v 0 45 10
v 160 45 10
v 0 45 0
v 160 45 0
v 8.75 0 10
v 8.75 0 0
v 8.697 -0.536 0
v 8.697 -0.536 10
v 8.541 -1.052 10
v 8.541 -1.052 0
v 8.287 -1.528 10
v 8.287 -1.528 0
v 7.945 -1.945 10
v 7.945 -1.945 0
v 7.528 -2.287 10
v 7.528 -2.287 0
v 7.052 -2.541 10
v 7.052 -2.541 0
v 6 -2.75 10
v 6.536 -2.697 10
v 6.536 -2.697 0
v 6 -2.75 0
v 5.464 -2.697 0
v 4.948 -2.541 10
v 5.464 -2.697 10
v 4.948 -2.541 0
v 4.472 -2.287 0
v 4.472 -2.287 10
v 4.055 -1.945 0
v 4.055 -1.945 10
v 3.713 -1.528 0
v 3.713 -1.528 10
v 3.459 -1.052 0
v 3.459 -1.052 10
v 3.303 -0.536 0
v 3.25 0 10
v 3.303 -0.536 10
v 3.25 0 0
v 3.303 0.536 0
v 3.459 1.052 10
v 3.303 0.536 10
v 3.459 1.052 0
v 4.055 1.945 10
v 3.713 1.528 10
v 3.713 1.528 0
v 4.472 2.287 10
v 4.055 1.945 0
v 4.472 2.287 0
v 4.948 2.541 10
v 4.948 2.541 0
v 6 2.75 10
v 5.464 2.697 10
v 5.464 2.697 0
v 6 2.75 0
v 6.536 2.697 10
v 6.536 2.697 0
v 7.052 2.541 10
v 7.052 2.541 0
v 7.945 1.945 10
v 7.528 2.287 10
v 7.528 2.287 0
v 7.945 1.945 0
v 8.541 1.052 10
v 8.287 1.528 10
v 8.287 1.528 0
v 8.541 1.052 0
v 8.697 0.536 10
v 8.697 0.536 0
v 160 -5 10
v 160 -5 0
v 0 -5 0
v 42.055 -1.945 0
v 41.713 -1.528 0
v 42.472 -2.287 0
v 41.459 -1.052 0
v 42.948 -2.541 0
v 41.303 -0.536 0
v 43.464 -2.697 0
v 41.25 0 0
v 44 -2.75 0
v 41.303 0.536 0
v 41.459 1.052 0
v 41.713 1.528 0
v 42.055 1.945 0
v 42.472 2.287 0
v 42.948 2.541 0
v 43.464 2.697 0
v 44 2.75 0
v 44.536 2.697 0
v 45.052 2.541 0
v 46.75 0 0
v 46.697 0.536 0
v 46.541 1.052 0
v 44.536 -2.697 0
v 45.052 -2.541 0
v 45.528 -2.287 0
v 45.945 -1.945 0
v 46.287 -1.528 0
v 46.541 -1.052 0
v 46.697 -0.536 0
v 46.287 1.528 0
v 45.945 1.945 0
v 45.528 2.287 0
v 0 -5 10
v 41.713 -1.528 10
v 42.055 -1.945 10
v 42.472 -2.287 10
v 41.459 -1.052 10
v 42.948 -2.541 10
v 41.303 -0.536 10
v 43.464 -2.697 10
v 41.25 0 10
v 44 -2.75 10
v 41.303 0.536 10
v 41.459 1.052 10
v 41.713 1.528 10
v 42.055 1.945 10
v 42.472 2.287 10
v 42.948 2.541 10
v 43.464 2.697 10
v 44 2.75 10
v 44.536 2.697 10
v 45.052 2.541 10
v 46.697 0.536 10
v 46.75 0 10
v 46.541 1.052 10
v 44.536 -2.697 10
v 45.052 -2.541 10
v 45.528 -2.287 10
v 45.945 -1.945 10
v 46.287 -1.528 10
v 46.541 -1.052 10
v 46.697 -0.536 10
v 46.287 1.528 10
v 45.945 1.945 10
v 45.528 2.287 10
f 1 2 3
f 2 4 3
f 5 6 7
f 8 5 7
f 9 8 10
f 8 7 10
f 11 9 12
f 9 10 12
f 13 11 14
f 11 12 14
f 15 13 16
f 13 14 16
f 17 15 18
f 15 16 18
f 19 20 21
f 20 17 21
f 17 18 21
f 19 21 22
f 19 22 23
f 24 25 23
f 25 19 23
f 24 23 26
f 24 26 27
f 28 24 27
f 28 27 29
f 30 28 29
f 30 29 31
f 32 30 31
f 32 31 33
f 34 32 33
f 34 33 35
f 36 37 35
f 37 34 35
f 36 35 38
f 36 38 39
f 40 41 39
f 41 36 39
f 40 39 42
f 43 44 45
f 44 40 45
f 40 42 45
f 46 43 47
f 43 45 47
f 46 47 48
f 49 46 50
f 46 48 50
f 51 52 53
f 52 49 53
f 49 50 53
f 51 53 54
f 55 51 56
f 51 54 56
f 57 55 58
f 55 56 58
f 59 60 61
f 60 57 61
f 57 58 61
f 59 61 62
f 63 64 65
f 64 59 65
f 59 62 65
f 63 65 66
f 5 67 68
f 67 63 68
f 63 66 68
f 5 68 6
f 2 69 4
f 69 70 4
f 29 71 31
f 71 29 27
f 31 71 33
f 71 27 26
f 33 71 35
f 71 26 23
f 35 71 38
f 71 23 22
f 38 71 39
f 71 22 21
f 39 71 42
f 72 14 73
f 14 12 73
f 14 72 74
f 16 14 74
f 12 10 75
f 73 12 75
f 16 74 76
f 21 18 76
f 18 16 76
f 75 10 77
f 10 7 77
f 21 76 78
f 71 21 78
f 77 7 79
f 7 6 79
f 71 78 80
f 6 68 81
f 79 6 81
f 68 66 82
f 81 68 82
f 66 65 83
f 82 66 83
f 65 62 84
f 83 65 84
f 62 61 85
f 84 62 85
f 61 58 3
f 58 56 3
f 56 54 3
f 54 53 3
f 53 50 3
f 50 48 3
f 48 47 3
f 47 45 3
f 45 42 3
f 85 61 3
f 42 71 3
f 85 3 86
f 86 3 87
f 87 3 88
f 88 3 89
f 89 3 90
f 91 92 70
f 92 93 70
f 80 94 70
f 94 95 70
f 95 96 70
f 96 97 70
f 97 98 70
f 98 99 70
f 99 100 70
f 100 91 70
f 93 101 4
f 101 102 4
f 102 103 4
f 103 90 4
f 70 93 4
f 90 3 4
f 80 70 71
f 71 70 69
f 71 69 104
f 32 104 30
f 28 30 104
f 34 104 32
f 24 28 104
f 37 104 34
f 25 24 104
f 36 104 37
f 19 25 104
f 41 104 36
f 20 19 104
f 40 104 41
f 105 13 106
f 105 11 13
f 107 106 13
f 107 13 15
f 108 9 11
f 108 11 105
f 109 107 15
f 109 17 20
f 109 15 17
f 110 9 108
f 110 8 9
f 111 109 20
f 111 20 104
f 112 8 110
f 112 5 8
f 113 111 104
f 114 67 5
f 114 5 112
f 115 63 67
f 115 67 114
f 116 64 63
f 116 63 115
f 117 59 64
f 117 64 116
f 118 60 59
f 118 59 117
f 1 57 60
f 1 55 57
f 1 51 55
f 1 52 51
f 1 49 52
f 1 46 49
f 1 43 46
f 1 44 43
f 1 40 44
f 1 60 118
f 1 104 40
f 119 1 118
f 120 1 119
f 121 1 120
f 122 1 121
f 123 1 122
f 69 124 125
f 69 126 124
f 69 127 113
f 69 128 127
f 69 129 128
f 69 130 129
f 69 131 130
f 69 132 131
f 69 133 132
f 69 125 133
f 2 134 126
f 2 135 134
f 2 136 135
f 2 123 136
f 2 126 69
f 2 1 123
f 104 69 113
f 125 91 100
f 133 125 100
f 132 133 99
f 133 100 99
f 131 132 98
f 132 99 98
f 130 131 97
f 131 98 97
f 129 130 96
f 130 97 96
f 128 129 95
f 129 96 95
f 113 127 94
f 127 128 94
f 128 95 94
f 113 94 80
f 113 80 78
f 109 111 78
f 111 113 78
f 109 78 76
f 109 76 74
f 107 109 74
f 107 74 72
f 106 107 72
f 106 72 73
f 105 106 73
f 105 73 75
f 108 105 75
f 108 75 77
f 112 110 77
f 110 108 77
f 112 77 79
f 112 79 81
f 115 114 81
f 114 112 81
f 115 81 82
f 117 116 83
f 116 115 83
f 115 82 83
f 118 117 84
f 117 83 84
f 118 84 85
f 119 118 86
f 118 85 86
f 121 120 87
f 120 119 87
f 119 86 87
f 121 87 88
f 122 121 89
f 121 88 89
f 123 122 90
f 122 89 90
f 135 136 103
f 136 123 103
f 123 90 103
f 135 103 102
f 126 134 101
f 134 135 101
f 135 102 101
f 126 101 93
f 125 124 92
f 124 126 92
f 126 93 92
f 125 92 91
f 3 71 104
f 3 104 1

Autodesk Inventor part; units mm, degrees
ref_plane "YZ Plane" through (0, 0, 0) normal (1, 0, 0) x (0, 1, 0)
ref_plane "XZ Plane" through (0, 0, 0) normal (0, 1, 0) x (-1, 0, 0)
ref_plane "XY Plane" through (0, 0, 0) normal (0, 0, 1) x (1, 0, 0)
sketch "スケッチ1" plane through (0, 0, 0) normal (0, 0, 1) x (1, 0, 0)
  line L0 (34.5, -2.7) -> (15.5, -2.7) projected
  line L1 (50, -5) -> (0, -5) projected
  line L2 (12, -5) -> (12, 5) projected
  circle A0 centre (44, 0) radius 2.75 projected
  circle A1 centre (6, 0) radius 2.75 projected
  line L3 (50, -5) -> (50, 5) projected
  line L4 (0, 5) -> (50, 5) projected
  line L5 (0, -5) -> (0, 5) projected
  line L6 (50, -5) -> (0, -5) projected
  line L7 (0, -5) -> (160, -5)
  line L8 (160, -5) -> (160, 45)
  line L9 (160, 45) -> (0, 45)
  line L10 (0, 45) -> (0, -5)
  point P0 (0, 0)
  dimension "d0" = 160
  dimension "d1" = 50
extrude "押し出し1" add sketch "スケッチ1" along normal blind 10
